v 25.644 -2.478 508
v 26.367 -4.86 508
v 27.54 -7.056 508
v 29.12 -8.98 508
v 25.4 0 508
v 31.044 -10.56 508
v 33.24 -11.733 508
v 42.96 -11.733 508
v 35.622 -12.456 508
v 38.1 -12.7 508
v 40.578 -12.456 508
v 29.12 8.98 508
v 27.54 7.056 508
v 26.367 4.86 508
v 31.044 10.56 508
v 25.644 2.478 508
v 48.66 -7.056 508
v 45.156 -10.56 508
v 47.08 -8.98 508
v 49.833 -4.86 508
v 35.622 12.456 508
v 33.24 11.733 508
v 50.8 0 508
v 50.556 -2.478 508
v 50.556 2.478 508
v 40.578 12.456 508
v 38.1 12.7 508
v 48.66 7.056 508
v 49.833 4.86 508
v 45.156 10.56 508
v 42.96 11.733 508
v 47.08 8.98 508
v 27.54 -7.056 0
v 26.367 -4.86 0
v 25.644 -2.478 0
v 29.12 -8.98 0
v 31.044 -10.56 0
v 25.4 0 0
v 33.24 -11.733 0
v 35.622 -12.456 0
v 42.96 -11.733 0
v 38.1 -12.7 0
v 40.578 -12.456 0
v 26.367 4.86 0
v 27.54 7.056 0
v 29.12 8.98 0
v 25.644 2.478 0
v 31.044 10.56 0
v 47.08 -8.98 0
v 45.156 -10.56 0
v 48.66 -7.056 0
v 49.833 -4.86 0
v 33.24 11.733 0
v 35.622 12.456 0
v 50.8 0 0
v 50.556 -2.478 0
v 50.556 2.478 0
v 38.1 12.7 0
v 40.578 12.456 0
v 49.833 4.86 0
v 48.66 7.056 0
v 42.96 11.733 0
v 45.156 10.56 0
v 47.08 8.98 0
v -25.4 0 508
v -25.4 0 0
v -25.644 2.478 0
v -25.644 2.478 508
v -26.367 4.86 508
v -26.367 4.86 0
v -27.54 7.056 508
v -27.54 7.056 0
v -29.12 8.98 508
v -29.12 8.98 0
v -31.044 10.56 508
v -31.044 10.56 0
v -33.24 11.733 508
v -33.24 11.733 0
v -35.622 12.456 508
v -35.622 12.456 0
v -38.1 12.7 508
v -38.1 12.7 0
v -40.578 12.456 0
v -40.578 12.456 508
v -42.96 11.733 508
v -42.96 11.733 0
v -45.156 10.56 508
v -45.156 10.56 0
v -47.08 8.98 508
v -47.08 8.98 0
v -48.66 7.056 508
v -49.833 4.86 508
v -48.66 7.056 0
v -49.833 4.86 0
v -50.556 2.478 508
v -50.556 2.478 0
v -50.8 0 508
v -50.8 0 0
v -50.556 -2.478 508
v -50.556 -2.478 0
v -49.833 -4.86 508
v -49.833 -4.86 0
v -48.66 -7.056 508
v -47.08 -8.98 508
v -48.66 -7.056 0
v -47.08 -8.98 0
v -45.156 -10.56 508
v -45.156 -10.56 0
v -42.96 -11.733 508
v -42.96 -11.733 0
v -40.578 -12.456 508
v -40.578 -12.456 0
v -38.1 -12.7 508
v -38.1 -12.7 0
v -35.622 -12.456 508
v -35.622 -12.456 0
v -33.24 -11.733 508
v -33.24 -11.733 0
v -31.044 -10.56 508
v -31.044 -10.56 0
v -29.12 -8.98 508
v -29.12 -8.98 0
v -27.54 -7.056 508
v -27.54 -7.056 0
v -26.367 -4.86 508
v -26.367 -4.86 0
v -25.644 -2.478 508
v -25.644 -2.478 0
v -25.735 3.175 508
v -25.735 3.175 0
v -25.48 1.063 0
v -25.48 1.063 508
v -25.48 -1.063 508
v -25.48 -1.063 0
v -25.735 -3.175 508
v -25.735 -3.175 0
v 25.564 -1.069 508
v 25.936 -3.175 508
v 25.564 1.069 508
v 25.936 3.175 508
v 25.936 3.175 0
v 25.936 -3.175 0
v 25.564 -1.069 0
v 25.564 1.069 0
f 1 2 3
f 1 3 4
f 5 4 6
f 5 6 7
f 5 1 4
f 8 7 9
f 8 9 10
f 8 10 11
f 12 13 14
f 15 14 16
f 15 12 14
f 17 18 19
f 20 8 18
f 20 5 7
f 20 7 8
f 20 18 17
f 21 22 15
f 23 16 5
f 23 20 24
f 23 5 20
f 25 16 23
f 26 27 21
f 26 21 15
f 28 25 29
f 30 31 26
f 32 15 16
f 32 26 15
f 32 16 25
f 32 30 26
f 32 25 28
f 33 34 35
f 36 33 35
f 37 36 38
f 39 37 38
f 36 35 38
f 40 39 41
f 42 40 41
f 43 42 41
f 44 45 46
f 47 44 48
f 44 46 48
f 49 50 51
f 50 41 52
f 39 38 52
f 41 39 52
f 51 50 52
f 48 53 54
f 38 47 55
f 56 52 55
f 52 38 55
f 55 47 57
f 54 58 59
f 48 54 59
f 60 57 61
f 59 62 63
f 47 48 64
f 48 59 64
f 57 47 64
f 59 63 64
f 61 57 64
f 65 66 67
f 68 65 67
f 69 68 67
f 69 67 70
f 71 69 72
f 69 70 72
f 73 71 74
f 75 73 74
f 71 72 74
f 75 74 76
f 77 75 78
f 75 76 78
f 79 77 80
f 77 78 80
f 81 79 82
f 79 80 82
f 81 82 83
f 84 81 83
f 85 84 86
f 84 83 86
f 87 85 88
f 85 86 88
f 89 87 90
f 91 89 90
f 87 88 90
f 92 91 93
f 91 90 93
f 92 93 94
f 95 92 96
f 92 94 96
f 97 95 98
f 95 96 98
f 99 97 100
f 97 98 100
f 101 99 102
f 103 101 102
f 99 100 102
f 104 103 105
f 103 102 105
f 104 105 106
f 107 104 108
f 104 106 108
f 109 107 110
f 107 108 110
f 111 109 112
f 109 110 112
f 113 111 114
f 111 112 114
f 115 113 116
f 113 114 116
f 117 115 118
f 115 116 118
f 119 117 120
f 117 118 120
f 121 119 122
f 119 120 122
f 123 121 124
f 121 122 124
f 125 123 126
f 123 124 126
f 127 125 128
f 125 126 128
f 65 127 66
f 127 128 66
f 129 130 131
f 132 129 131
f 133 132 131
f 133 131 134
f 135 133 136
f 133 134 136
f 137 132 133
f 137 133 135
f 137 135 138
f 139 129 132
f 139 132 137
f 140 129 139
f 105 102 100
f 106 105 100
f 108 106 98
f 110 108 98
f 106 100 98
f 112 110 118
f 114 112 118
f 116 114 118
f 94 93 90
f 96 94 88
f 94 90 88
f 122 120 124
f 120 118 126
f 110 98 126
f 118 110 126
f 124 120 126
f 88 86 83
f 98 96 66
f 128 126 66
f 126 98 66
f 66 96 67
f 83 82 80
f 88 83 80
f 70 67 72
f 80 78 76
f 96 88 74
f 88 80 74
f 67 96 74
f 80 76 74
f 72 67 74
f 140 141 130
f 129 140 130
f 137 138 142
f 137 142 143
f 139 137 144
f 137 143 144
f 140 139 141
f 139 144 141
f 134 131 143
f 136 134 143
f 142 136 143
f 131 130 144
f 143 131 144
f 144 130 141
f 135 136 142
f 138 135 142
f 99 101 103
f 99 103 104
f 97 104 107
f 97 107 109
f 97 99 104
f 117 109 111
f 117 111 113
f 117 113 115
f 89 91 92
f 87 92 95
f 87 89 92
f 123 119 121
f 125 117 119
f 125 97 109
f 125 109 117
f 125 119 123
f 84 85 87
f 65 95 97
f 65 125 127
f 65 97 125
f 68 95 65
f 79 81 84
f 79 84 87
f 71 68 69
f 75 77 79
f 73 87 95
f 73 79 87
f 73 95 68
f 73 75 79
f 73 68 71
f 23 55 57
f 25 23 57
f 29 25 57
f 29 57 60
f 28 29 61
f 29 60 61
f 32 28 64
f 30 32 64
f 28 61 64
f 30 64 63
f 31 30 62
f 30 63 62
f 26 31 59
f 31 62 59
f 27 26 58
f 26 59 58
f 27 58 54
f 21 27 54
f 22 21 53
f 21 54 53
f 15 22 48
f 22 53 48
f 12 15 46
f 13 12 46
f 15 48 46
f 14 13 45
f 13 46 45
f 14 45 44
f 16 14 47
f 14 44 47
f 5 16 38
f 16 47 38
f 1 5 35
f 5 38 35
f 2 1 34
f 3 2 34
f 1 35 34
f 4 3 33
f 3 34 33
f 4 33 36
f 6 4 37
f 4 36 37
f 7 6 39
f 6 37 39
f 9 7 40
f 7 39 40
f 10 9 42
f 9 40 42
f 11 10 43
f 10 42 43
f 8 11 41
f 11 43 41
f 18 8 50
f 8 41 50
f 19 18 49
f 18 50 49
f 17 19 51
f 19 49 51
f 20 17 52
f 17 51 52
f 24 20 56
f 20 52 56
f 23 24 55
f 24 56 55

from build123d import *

# Parameters (mm, degrees)
F0_R     = 12.7
F2_DEPTH = 508


with BuildPart() as f2:
    # F0 (on Top) → F2 (new body)
    with BuildSketch(Plane.XY):
        with Locations((-38.1, 0)):
            Circle(F0_R)
    extrude(amount=F2_DEPTH)


with BuildPart() as f2b:
    # F0 (on Top) → F2, piece 2 (new body)
    with BuildSketch(Plane.XY):
        with Locations((38.1, 0)):
            Circle(F0_R)
    extrude(amount=F2_DEPTH)


with BuildPart() as f2c:
    # F1 (on Top) → F2, piece 3 (new body)
    with BuildSketch(Plane.XY):
        with BuildLine():
            ThreePointArc((-25.7351007313, 3.175), (-25.4483427685, 0), (-25.7351007313, -3.175))
            Line((-25.7351007313, -3.175), (25.9355138987, -3.175))
            ThreePointArc((25.9355138987, -3.175), (25.517717555, 0), (25.9355138987, 3.175))
            Line((25.9355138987, 3.175), (-25.7351007313, 3.175))
        make_face()
    extrude(amount=F2_DEPTH)


solid = Compound([f2.part, f2b.part, f2c.part])
